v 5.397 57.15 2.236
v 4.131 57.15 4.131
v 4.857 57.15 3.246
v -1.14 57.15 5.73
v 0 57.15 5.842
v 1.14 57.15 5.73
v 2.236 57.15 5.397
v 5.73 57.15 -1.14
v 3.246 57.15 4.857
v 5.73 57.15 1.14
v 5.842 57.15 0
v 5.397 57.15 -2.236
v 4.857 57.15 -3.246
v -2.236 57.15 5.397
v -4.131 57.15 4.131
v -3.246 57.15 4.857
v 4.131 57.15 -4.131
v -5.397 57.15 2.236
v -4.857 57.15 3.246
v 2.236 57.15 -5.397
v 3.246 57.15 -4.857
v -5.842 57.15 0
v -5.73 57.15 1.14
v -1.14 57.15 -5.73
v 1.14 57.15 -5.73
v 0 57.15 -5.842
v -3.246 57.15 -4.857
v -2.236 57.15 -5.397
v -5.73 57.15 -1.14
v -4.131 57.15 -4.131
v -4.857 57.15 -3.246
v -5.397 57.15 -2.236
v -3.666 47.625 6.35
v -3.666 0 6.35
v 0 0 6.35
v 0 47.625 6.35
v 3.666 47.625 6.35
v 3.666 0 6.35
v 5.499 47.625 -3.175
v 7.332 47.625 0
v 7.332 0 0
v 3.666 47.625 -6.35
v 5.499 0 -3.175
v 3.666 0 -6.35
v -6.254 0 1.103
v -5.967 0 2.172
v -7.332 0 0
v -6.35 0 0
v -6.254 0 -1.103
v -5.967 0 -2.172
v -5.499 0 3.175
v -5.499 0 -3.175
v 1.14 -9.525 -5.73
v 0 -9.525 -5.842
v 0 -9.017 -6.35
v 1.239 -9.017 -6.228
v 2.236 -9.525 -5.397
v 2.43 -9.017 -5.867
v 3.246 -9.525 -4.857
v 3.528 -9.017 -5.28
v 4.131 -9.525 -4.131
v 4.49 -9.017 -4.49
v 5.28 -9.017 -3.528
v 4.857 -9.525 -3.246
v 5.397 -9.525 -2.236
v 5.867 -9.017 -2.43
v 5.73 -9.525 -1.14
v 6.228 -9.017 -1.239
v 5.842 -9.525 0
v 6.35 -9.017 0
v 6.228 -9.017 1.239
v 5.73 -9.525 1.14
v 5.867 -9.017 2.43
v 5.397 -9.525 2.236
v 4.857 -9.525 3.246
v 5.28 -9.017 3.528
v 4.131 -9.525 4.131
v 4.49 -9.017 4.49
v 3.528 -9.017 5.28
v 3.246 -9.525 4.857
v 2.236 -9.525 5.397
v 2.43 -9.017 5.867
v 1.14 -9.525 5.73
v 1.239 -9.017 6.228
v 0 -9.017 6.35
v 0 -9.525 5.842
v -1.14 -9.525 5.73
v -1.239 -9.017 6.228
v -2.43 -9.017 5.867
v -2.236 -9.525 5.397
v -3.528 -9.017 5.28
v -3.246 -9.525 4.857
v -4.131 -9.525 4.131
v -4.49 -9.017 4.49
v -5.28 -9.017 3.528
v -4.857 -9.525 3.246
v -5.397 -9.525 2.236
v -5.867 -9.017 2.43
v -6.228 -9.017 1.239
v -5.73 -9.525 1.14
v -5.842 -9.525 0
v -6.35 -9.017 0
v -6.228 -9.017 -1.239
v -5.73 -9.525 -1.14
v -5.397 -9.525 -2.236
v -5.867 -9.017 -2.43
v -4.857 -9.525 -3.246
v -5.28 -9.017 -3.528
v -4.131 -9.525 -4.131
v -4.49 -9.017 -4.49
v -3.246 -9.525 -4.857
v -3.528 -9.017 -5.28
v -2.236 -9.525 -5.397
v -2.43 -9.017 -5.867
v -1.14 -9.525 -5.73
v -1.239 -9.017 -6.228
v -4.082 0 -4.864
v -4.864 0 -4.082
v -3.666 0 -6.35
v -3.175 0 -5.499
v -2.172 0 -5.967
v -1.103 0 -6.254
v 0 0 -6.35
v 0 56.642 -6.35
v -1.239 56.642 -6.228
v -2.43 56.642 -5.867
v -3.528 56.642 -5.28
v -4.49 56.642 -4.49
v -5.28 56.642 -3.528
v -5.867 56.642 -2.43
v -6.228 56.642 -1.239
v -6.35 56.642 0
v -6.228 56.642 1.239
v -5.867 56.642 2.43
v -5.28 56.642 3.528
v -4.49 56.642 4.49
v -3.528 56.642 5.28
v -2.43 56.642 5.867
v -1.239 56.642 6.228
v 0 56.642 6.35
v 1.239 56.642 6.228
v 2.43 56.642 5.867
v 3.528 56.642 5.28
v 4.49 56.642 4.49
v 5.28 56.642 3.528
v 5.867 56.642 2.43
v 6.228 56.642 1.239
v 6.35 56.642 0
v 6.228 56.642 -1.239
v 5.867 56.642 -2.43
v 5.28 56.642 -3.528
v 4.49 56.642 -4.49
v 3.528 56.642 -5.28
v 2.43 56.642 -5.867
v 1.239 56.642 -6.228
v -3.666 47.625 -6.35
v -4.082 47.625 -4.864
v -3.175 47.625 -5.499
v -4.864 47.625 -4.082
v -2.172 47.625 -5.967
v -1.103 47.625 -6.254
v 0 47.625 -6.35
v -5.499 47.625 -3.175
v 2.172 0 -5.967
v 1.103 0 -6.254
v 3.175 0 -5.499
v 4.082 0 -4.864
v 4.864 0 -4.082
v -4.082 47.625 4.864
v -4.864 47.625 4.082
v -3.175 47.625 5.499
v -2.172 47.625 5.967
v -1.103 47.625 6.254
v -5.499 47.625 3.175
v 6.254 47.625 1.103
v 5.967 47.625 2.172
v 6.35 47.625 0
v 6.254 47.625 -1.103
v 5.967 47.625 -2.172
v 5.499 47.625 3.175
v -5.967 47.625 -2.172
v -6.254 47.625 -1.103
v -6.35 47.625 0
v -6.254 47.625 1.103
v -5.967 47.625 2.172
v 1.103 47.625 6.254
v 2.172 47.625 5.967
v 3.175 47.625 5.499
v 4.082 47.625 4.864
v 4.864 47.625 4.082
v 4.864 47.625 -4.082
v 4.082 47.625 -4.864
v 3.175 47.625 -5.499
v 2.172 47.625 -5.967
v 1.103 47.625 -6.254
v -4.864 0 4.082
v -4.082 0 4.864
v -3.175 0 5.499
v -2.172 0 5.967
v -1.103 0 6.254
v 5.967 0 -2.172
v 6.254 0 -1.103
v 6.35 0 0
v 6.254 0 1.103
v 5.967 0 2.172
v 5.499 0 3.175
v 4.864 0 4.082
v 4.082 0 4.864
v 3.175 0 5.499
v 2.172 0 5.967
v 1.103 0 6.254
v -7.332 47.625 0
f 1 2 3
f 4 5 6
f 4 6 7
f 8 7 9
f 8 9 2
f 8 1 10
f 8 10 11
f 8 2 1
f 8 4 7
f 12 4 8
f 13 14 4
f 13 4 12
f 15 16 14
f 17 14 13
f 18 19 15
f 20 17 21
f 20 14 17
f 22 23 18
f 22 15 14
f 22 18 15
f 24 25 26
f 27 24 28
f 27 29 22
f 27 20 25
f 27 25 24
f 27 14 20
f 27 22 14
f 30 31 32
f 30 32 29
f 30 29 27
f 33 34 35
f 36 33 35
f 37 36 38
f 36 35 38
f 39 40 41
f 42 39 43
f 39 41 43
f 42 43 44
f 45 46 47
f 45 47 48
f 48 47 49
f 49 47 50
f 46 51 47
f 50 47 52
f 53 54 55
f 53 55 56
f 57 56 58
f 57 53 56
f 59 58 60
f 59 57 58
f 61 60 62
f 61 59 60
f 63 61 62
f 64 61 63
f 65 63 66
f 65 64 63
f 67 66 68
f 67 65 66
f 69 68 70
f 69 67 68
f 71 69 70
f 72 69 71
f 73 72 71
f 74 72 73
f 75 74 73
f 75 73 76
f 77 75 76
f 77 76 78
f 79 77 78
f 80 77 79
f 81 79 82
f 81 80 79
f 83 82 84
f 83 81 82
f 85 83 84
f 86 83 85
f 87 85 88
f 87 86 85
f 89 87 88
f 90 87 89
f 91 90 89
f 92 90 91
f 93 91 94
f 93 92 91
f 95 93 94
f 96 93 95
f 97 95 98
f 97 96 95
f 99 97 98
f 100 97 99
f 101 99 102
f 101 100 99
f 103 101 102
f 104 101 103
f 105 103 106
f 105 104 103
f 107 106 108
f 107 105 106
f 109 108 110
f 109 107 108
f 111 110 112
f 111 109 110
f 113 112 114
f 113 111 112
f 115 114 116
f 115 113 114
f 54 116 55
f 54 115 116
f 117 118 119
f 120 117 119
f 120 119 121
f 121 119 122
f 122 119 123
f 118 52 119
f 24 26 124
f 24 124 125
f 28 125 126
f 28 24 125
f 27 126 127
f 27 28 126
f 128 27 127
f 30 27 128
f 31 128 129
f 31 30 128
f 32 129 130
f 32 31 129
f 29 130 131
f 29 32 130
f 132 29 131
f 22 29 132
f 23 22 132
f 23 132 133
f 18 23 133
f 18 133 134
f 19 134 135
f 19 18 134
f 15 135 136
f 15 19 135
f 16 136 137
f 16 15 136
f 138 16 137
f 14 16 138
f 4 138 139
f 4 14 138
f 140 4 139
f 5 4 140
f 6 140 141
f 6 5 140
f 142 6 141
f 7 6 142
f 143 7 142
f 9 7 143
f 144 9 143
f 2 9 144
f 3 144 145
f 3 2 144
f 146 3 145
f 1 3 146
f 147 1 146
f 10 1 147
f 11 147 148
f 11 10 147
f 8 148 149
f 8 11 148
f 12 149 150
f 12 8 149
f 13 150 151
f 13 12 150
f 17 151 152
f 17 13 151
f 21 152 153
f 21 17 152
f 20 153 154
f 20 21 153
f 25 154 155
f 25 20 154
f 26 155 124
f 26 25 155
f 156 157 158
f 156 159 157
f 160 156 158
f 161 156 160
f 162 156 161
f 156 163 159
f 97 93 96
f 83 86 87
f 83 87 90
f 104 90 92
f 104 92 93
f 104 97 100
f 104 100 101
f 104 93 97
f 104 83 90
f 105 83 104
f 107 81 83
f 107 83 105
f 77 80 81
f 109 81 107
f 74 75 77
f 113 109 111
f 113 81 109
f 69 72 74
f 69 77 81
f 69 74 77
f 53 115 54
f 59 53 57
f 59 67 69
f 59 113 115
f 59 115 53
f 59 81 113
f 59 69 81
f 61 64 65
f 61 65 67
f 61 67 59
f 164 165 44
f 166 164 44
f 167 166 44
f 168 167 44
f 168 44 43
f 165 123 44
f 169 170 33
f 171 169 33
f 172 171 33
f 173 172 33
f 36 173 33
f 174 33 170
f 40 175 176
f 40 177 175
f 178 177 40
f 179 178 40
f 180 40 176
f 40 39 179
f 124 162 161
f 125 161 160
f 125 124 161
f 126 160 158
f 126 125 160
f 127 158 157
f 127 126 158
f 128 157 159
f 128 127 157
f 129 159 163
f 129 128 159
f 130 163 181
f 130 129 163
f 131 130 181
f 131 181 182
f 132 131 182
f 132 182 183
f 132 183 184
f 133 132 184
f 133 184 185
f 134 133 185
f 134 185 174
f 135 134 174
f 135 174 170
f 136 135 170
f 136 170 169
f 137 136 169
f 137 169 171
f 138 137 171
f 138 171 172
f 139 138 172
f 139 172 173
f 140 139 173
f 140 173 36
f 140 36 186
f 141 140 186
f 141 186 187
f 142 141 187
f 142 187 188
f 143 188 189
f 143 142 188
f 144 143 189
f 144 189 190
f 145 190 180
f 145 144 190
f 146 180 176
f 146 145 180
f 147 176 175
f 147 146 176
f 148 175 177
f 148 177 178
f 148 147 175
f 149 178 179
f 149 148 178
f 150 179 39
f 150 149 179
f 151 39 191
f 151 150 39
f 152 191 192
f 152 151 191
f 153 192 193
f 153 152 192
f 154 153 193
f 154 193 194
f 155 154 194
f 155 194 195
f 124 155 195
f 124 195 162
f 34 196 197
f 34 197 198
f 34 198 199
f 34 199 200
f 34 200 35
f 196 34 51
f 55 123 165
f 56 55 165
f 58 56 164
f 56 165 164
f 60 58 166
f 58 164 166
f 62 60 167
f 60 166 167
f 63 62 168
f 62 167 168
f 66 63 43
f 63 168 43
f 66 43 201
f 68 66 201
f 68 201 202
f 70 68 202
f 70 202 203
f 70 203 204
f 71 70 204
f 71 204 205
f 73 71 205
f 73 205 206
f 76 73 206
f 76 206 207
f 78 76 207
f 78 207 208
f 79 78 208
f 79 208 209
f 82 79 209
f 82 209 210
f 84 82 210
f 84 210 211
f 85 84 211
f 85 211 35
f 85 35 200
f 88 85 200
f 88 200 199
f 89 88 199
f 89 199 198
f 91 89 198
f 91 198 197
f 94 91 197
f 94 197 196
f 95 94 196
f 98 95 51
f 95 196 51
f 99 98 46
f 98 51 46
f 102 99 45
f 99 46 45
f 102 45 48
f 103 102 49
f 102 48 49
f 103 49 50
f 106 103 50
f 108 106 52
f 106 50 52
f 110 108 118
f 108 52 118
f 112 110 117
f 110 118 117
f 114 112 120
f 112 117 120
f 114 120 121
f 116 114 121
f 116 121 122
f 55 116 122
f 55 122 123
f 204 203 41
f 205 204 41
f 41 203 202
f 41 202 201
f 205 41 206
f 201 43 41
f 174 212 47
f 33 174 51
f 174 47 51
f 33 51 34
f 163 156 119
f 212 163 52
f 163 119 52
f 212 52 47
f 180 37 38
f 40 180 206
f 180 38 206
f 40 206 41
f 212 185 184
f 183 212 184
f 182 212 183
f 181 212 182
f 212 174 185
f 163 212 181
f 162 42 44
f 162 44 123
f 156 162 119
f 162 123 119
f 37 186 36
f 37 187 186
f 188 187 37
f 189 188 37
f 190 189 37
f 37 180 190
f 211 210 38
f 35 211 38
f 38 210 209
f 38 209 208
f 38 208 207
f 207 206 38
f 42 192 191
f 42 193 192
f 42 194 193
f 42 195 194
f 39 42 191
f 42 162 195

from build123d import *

# Parameters (mm, degrees)
BOSS_EXTRUDE1_DEPTH = 47.625
SKETCH2_R           = 6.35
BOSS_EXTRUDE2_DEPTH = 9.525
BOSS_EXTRUDE3_START = 9.525
SKETCH3_R           = 6.35
BOSS_EXTRUDE3_DEPTH = 9.525
CHAMFER2_SIZE       = 0.508


with BuildPart() as part:
    # Sketch1 → Boss-Extrude1 (new body)
    with BuildSketch(Plane(origin=(0, 0, 0), x_dir=(1, 0, 0), z_dir=(0, 1, 0))):
        Polygon((3.666174209, -6.35), (7.332348419, 0), (3.666174209, 6.35), (-3.666174209, 6.35), (-7.332348419, 0), (-3.666174209, -6.35), align=None)
    extrude(amount=BOSS_EXTRUDE1_DEPTH)

    # Sketch2 → Boss-Extrude2 (add)
    with BuildSketch(Plane(origin=(0, 0, 0), x_dir=(-1, 0, 0), z_dir=(0, -1, 0))):
        with Locations(Location((0, 0, 0), (0, 0, 90))):
            Circle(SKETCH2_R)
    extrude(amount=BOSS_EXTRUDE2_DEPTH)

    # Sketch3 → Boss-Extrude3 (add)
    with BuildSketch(Plane(origin=(0, 47.625, 0), x_dir=(1, 0, 0), z_dir=(0, 1, 0)).offset(BOSS_EXTRUDE3_START)):
        with Locations(Location((0, 0, 0), (0, 0, 90))):
            Circle(SKETCH3_R)
    extrude(amount=-BOSS_EXTRUDE3_DEPTH)

    # Chamfer2
    chamfer2_edges = [part.edges().sort_by_distance(p)[0] for p in [
        (0, -9.525, 6.35),
        (0, 57.15, 6.35),
    ]]
    chamfer(chamfer2_edges, length=CHAMFER2_SIZE)


solid = part.part
